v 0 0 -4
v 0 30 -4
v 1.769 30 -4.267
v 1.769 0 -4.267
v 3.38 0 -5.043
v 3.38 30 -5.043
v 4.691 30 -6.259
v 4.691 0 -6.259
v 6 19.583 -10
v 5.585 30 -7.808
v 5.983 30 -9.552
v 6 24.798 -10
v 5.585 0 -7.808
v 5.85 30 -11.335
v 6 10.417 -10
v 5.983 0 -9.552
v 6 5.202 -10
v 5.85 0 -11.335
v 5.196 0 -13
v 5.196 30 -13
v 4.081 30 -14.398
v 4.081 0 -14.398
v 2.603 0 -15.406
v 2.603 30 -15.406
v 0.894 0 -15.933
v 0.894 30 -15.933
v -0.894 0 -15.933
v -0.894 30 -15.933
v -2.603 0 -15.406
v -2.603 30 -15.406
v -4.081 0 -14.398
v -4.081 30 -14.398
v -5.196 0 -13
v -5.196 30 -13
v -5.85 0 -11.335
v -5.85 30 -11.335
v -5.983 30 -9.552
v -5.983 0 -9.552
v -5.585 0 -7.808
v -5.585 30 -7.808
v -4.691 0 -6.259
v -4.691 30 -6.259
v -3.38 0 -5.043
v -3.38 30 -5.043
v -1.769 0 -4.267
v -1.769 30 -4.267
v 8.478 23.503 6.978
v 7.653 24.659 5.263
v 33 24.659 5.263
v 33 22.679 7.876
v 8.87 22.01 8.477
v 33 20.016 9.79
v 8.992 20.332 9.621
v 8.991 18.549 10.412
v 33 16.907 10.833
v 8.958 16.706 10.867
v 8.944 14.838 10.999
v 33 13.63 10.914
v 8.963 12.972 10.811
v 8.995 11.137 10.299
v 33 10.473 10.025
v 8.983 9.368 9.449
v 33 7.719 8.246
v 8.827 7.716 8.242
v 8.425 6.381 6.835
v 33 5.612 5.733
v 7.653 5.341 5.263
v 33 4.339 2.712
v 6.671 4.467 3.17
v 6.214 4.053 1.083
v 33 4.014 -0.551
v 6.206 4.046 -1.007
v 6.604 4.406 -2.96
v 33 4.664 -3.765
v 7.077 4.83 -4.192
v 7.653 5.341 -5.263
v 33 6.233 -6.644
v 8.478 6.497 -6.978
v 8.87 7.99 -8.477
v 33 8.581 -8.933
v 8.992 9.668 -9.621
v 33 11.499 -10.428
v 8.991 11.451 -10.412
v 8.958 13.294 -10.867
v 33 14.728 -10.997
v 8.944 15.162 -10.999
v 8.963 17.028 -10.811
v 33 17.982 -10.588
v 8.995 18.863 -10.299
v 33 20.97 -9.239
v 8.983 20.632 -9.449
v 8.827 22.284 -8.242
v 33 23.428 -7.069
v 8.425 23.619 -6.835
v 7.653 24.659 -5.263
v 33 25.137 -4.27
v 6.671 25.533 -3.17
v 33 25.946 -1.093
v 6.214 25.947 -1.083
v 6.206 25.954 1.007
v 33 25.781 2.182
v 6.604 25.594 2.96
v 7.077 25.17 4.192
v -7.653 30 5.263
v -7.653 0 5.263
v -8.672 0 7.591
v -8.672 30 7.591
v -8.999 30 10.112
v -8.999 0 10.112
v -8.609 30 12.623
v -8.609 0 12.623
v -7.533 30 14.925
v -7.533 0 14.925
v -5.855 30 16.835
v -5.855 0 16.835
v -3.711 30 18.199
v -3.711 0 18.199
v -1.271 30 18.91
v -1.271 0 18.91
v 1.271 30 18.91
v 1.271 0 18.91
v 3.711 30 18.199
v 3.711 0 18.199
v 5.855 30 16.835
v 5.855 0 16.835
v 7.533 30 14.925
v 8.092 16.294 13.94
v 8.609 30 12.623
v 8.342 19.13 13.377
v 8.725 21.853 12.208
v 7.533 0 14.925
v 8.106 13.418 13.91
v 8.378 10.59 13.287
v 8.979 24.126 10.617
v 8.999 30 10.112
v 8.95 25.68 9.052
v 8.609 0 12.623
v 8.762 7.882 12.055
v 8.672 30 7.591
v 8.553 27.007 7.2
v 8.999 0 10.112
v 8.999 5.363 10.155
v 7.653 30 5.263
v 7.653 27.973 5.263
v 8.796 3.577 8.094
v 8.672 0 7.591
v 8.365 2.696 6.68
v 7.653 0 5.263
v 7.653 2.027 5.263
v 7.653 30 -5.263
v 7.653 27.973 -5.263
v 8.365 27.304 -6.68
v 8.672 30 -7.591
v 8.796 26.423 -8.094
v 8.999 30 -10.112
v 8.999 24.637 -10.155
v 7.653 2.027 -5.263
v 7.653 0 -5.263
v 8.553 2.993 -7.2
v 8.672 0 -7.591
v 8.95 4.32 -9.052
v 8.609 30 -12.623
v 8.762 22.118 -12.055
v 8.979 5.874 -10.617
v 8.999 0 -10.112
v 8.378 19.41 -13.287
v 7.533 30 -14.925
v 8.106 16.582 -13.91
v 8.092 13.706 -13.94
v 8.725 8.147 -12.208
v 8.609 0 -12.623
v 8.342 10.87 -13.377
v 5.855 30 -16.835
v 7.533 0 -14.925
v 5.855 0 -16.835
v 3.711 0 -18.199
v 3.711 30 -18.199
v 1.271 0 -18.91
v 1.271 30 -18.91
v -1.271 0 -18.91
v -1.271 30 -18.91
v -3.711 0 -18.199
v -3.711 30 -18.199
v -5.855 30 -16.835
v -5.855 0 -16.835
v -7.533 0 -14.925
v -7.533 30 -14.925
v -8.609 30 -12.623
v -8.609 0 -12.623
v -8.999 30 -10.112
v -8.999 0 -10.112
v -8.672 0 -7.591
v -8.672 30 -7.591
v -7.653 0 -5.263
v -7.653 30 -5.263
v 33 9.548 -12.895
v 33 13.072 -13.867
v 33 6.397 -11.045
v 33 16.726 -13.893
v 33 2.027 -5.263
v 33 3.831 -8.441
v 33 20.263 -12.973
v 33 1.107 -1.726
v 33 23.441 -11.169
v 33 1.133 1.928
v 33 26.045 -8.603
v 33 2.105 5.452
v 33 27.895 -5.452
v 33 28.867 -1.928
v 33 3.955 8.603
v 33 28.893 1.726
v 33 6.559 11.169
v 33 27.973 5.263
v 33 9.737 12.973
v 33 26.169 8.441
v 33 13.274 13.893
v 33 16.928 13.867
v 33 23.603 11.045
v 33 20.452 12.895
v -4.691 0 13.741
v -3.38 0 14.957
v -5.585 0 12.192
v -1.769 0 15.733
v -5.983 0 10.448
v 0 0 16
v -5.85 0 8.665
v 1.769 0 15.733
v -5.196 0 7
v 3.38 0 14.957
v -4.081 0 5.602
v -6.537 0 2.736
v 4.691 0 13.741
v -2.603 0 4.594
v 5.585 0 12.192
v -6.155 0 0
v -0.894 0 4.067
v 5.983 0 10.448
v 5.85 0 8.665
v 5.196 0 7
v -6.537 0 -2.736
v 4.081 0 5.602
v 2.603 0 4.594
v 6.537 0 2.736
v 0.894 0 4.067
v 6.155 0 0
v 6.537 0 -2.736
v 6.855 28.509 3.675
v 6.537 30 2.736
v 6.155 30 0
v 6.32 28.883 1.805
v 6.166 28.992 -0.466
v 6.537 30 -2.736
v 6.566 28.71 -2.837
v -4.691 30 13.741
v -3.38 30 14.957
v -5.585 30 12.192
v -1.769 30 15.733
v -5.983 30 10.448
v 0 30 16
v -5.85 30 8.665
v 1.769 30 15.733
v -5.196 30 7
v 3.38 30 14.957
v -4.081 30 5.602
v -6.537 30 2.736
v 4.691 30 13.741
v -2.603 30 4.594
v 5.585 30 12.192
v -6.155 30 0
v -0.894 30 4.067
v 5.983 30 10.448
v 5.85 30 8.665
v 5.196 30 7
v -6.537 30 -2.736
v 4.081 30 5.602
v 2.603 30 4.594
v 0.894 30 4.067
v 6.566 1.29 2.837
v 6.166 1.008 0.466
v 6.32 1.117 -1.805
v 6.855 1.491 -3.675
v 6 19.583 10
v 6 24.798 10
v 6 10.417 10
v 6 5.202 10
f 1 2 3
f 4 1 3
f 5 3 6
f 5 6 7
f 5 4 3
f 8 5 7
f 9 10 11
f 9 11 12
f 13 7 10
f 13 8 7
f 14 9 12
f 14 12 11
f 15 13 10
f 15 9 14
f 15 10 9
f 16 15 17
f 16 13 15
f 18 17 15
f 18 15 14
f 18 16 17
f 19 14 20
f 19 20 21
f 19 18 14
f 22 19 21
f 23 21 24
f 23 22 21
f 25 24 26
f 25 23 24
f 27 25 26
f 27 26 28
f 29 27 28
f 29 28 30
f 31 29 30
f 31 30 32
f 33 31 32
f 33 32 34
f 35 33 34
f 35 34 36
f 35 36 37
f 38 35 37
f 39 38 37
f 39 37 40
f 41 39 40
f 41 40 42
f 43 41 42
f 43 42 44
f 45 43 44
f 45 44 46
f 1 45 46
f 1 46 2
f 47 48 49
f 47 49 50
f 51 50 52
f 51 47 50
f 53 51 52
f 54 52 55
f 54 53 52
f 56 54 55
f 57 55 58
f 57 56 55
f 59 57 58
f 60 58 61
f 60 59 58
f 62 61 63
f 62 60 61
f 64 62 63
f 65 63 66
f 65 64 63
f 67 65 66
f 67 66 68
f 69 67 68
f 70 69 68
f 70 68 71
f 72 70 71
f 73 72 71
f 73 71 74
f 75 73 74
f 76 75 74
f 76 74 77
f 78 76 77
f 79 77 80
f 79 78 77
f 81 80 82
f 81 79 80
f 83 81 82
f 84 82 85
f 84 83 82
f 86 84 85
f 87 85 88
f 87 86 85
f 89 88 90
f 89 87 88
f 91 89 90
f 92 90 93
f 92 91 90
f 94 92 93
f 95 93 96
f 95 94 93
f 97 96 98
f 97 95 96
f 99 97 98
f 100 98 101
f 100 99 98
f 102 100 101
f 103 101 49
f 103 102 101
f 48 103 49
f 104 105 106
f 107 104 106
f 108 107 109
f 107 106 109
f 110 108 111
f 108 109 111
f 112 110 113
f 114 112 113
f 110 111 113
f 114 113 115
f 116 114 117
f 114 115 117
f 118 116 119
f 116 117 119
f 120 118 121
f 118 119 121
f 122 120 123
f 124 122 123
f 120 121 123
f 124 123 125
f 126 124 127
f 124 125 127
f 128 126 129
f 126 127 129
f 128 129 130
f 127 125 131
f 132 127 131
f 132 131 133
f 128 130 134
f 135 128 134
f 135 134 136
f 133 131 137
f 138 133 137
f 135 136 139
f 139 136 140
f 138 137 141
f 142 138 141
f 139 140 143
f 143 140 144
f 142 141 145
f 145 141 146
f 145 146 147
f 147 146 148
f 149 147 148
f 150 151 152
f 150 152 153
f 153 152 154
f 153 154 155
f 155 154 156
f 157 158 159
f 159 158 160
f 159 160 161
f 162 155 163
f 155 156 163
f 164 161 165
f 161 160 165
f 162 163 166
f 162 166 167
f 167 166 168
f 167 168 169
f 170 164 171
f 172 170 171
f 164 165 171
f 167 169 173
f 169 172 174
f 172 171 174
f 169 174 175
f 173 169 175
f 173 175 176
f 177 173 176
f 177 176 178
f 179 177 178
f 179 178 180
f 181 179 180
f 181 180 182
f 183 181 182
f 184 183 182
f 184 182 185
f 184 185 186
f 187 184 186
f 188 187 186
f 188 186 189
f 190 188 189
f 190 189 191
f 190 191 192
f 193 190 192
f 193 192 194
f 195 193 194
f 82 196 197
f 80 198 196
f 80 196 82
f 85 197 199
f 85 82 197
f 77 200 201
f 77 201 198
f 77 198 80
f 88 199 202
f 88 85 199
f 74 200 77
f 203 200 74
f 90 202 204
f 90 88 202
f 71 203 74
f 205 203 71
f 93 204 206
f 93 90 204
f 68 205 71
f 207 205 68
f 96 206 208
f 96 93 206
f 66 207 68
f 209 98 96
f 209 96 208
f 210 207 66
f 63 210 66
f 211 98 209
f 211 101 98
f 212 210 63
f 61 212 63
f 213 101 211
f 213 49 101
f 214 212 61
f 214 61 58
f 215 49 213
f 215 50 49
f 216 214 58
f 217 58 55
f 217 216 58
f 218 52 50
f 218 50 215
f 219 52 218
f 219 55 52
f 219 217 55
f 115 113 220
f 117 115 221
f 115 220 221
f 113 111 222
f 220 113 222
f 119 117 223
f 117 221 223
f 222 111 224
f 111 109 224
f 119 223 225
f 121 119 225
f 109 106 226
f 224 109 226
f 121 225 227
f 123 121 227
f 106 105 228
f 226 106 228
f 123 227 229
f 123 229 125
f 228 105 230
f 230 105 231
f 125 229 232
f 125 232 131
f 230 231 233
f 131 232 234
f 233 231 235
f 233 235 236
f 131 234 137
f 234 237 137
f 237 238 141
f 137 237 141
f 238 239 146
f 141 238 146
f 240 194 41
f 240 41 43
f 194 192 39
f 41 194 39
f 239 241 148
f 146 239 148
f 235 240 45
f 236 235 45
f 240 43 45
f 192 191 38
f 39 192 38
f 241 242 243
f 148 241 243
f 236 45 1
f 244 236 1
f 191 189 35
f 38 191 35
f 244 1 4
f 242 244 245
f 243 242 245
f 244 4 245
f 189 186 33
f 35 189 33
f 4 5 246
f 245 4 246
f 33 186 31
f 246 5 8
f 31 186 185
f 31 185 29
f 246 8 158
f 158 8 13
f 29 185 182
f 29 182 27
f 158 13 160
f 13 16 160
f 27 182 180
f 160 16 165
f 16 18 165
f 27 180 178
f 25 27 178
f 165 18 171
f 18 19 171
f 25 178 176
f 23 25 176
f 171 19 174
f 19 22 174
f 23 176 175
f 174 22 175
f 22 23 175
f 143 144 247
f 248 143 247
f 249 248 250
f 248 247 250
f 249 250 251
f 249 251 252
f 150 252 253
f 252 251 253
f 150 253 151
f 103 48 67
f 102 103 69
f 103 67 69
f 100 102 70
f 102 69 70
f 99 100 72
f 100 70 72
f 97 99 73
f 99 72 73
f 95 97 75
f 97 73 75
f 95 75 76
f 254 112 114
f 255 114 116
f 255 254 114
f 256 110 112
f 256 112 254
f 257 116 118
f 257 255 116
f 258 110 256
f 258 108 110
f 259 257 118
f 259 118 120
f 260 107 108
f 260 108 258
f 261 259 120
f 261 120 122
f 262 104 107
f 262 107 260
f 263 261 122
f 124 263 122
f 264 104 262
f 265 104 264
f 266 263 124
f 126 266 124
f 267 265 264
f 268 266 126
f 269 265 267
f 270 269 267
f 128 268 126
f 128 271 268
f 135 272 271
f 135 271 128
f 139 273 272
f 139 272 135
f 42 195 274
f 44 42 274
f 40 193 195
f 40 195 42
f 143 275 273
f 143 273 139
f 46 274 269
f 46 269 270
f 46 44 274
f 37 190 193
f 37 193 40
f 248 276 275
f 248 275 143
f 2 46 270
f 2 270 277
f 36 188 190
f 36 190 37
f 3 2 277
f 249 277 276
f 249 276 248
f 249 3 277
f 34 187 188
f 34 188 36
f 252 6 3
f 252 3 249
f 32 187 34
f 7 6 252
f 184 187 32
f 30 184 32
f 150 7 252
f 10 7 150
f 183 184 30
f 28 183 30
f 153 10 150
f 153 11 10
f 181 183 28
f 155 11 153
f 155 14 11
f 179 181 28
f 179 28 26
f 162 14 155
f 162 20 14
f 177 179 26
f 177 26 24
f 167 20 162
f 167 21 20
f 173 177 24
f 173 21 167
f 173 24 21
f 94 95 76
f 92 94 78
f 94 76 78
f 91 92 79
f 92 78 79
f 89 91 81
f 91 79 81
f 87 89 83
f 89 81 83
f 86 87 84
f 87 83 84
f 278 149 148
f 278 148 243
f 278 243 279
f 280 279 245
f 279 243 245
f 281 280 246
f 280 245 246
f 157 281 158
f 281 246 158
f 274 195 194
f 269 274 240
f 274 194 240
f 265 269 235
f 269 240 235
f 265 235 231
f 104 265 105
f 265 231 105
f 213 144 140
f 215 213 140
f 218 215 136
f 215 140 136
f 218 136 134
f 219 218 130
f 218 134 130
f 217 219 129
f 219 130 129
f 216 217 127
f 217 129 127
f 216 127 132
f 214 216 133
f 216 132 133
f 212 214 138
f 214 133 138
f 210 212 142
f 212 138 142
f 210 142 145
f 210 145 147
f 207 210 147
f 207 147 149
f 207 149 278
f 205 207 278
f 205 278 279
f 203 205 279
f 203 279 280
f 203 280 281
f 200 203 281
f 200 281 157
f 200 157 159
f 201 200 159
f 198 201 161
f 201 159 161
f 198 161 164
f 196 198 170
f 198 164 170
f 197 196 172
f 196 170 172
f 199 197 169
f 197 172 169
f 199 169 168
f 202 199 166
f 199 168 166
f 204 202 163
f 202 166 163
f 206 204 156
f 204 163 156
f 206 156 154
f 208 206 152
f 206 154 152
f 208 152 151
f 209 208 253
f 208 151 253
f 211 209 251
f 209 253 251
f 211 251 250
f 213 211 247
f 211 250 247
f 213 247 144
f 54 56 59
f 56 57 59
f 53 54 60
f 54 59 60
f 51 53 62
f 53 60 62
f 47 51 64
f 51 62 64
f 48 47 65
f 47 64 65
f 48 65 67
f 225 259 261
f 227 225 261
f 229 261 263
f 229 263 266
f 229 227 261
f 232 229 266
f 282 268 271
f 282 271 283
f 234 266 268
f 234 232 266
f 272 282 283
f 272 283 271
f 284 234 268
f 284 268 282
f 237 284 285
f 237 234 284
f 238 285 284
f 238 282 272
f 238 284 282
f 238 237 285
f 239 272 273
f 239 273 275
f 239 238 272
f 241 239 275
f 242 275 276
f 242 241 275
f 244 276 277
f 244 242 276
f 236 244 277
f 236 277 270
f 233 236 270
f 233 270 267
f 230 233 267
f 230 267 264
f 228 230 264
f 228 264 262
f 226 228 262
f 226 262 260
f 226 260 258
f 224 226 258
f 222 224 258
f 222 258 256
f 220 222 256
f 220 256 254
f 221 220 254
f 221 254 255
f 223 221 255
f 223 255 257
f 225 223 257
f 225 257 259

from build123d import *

# Parameters (mm, degrees)
SKETCH1_R                = 6
BOSS_EXTRUDE1_DEPTH      = 30
BOSS_EXTRUDE2_DEPTH      = 23
BOSS_EXTRUDE2_DEPTH_BACK = 4
SKETCH2_R                = 14
SKETCH2_R_2              = 11


with BuildPart() as part:
    # Sketch1 → Boss-Extrude1 (new body)
    with BuildSketch(Plane(origin=(0, 0, 0), x_dir=(1, 0, 0), z_dir=(0, 1, 0))):
        with BuildLine():
            ThreePointArc((7.652602621, 5.263157895), (0, 19), (-7.652602621, 5.263157895))
            ThreePointArc((-7.652602621, 5.263157895), (-6.155494421, 0), (-7.652602621, -5.263157895))
            ThreePointArc((-7.652602621, -5.263157895), (0, -19), (7.652602621, -5.263157895))
            ThreePointArc((7.652602621, -5.263157895), (6.155494421, 0), (7.652602621, 5.263157895))
        make_face()
        with Locations(Location((0, 10, 0), (0, 0, 270))):
            Circle(SKETCH1_R, mode=Mode.SUBTRACT)
        with Locations(Location((0, -10, 0), (0, 0, 270))):
            Circle(SKETCH1_R, mode=Mode.SUBTRACT)
    extrude(amount=BOSS_EXTRUDE1_DEPTH)

    # Sketch2 → Boss-Extrude2 (add, two sides: drawn at the far end of the back side and taken through both)
    with BuildSketch(Plane(origin=(10, 0, 0), x_dir=(0, 0, -1), z_dir=(1, 0, 0)).offset(-BOSS_EXTRUDE2_DEPTH_BACK)):
        with Locations(Location((0, 15, 0), (0, 0, 112.082413194))):
            Circle(SKETCH2_R)
        with Locations(Location((0, 15, 0), (0, 0, 118.585451093))):
            Circle(SKETCH2_R_2, mode=Mode.SUBTRACT)
    extrude(amount=BOSS_EXTRUDE2_DEPTH + BOSS_EXTRUDE2_DEPTH_BACK)


solid = part.part
